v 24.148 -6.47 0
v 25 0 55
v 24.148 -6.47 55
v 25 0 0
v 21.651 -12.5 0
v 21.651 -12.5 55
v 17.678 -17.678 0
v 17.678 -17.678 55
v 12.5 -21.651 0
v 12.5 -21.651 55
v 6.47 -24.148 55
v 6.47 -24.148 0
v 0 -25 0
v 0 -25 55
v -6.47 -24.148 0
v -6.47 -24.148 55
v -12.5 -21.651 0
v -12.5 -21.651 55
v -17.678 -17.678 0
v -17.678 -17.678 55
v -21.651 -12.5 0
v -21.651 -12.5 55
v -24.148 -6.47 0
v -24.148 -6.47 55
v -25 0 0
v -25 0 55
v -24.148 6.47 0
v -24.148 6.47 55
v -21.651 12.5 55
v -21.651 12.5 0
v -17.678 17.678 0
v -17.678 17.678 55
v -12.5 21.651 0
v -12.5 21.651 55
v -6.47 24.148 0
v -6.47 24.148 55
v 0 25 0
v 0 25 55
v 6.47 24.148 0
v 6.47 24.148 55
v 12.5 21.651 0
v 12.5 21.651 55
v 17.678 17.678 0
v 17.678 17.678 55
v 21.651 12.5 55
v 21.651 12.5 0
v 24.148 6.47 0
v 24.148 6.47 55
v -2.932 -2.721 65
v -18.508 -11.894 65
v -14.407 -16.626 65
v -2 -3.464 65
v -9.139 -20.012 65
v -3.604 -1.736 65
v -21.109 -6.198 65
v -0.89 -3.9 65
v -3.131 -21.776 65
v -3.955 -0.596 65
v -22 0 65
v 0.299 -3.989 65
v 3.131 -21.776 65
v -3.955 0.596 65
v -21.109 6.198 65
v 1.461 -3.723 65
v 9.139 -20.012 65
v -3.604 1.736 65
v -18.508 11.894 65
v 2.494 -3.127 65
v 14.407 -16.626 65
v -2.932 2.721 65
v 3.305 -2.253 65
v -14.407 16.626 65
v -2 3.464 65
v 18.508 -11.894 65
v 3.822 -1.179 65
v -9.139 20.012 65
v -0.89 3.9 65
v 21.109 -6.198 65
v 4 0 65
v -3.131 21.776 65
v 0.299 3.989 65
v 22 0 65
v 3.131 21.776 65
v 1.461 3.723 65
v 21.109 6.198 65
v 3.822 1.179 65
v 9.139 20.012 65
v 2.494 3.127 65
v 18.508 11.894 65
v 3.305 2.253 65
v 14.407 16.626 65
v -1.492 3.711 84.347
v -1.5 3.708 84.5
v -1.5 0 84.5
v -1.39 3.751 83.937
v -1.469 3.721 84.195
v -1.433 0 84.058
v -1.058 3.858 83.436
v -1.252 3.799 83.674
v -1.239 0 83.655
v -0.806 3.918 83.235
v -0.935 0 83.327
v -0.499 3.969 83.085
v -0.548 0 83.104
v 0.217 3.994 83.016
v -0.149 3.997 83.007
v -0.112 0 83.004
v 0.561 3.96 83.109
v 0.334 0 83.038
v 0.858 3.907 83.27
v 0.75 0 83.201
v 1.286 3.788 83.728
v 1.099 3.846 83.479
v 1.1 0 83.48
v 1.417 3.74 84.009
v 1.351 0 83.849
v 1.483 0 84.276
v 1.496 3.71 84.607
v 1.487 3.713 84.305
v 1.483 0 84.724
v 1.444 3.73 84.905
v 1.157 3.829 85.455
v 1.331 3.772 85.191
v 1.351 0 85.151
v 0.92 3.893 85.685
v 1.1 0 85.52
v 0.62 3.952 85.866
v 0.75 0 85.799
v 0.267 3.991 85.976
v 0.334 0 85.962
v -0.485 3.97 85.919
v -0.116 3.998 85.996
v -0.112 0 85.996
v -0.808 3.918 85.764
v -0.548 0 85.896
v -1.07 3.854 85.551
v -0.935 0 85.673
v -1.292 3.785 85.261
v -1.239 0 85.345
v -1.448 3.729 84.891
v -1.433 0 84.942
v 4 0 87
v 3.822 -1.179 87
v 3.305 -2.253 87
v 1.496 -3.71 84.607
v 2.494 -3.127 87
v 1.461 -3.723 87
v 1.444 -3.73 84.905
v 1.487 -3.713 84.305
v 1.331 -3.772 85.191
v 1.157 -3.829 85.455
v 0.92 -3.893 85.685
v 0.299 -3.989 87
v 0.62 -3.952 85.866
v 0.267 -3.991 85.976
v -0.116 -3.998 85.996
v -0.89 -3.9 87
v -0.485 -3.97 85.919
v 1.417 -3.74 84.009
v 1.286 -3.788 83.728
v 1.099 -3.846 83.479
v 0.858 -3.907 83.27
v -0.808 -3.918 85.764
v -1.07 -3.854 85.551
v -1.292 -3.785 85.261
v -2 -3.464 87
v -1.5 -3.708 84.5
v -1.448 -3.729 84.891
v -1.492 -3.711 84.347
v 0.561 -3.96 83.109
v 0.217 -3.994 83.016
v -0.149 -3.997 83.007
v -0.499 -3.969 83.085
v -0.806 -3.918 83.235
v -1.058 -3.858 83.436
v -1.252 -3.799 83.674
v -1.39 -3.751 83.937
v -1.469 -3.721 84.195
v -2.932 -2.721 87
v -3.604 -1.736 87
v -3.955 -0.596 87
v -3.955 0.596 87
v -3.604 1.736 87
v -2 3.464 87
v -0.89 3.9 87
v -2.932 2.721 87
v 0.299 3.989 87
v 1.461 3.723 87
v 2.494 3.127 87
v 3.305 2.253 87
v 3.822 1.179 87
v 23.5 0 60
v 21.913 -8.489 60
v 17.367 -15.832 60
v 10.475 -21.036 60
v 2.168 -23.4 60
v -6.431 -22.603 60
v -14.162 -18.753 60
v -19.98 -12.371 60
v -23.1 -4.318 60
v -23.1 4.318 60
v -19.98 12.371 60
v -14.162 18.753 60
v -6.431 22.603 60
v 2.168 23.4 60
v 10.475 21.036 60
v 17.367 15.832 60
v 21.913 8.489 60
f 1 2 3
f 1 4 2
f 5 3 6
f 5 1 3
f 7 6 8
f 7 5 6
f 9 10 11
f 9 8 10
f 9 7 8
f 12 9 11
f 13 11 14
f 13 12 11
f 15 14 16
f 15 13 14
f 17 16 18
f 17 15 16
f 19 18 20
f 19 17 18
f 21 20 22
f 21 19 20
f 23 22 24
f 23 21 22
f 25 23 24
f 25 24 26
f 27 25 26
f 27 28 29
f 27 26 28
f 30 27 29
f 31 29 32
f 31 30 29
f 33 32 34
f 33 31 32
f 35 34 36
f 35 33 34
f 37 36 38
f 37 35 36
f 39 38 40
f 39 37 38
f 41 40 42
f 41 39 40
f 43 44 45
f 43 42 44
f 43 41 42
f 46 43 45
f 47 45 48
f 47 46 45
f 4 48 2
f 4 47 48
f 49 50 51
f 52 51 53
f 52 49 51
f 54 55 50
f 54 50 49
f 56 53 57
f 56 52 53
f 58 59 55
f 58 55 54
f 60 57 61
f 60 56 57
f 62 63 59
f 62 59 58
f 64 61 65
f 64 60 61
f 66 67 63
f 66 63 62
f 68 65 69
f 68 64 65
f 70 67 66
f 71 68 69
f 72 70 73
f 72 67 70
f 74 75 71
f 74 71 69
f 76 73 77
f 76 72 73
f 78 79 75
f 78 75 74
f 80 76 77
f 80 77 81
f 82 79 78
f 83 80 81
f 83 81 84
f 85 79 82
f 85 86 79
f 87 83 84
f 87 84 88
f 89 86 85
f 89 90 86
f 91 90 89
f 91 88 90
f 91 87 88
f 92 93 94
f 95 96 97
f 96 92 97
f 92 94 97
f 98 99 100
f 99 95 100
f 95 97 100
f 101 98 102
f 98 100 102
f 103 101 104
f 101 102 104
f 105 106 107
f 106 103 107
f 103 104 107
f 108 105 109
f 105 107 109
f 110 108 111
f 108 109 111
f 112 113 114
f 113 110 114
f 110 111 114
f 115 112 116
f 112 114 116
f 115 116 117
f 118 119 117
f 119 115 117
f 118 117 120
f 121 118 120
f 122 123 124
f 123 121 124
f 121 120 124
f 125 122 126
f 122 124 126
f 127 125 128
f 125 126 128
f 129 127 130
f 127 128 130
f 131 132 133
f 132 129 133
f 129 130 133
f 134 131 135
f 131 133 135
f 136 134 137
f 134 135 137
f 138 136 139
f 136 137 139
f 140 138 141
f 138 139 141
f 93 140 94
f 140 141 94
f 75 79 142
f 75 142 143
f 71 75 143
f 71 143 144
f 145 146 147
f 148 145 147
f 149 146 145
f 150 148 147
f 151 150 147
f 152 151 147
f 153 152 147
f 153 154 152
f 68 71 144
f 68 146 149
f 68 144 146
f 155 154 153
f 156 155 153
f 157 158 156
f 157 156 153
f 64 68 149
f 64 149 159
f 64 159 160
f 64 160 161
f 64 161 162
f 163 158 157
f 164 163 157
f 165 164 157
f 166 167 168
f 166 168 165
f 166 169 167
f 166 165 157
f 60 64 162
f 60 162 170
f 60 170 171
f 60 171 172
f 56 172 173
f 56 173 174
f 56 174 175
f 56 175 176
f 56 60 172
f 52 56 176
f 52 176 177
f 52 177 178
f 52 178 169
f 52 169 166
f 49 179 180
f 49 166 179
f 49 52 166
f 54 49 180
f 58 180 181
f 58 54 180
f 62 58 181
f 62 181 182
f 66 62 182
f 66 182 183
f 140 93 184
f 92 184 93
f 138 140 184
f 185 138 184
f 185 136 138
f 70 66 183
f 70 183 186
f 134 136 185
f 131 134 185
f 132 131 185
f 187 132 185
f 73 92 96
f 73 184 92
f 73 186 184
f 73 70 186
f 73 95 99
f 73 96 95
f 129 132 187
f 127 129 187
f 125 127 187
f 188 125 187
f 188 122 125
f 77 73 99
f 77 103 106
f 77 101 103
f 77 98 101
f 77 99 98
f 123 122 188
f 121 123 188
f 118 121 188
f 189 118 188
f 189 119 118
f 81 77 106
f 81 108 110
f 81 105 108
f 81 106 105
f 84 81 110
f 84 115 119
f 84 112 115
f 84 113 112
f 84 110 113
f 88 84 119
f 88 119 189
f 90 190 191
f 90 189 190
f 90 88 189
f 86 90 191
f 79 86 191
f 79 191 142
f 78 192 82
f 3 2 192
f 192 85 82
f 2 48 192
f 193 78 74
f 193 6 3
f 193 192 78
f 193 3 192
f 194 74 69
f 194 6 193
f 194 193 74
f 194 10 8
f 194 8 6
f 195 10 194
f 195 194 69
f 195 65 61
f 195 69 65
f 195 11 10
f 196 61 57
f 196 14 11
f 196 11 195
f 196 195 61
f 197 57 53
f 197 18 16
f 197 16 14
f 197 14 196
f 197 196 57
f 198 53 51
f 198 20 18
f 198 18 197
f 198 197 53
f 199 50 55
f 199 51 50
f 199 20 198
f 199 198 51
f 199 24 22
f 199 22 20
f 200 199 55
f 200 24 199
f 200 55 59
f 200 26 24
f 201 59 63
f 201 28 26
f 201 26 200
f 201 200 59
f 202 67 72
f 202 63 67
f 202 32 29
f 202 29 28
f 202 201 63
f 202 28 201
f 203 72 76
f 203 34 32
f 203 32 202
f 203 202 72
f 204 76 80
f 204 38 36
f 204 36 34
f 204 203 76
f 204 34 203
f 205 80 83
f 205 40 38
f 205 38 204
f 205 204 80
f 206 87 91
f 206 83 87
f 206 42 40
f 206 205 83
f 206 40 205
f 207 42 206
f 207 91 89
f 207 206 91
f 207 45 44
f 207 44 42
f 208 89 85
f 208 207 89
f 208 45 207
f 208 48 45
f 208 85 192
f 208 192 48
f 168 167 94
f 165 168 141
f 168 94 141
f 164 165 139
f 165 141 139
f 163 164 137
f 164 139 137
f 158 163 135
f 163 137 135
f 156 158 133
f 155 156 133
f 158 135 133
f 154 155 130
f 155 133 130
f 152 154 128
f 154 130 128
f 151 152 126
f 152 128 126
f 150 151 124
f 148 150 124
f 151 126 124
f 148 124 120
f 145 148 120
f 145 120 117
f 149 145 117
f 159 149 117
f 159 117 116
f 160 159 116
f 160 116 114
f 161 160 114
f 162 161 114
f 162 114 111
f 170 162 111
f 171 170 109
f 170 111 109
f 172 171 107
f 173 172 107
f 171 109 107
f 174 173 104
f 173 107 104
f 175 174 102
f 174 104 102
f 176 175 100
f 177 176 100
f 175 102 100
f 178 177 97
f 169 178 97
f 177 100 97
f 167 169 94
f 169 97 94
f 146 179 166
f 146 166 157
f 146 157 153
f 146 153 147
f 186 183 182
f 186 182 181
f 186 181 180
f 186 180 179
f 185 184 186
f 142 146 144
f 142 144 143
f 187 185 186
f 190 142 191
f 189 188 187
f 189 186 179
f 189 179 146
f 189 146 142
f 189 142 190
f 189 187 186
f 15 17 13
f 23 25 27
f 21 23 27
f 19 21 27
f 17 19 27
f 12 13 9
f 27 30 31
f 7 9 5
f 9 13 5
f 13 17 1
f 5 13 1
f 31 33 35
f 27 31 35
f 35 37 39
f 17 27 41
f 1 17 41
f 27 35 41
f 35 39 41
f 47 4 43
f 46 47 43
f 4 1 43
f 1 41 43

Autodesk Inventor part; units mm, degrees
ref_plane "YZ Plane" through (0, 0, 0) normal (1, 0, 0) x (0, 1, 0)
sketch "Sketch2" plane through (0, 0, 0) normal (0, 0, 1) x (1, 0, 0)
  circle A0 centre (0, 0) radius 25
  dimension "d0" = 50
extrude "Extrusion1" add sketch "Sketch2" along normal blind 65
sketch "Sketch3" plane through (0, 0, 65) normal (0, 0, 1) x (1, 0, 0)
  circle A0 centre (0, 0) radius 4
  dimension "d3" = 8
extrude "Extrusion2" add sketch "Sketch3" along normal blind 22
ref_plane "Work Plane1" through (0, 0, 55) normal (0, 0, 1) x (1, 0, 0)
ref_plane "Work Plane2" through (0, 0, 10) normal (0, 0, -1) x (-1, 0, 0)
split_face "Split1"
split_face "Split2"
chamfer "Chamfer1" distance 3 distance2 10 1 edges at (-25, 0, 65) measured on face at (17.7191, -2.3134, 65)
sketch "Sketch4" plane through (0, 0, 0) normal (0, 1, 0) x (-1, 0, 0)
  line L0 (4, 87) -> (-4, 87) projected
  line L1 (-4, 65) -> (4, 65) projected
  circle A0 centre (0, 84.5) radius 1.5
  point P0 (0, 0)
  dimension "d11" = 3
  dimension "d12" = 2.5
extrude "Extrusion3" cut sketch "Sketch4" along normal through all both and the other way through all
properties part number "Motor" material "Aluminum 6061"
